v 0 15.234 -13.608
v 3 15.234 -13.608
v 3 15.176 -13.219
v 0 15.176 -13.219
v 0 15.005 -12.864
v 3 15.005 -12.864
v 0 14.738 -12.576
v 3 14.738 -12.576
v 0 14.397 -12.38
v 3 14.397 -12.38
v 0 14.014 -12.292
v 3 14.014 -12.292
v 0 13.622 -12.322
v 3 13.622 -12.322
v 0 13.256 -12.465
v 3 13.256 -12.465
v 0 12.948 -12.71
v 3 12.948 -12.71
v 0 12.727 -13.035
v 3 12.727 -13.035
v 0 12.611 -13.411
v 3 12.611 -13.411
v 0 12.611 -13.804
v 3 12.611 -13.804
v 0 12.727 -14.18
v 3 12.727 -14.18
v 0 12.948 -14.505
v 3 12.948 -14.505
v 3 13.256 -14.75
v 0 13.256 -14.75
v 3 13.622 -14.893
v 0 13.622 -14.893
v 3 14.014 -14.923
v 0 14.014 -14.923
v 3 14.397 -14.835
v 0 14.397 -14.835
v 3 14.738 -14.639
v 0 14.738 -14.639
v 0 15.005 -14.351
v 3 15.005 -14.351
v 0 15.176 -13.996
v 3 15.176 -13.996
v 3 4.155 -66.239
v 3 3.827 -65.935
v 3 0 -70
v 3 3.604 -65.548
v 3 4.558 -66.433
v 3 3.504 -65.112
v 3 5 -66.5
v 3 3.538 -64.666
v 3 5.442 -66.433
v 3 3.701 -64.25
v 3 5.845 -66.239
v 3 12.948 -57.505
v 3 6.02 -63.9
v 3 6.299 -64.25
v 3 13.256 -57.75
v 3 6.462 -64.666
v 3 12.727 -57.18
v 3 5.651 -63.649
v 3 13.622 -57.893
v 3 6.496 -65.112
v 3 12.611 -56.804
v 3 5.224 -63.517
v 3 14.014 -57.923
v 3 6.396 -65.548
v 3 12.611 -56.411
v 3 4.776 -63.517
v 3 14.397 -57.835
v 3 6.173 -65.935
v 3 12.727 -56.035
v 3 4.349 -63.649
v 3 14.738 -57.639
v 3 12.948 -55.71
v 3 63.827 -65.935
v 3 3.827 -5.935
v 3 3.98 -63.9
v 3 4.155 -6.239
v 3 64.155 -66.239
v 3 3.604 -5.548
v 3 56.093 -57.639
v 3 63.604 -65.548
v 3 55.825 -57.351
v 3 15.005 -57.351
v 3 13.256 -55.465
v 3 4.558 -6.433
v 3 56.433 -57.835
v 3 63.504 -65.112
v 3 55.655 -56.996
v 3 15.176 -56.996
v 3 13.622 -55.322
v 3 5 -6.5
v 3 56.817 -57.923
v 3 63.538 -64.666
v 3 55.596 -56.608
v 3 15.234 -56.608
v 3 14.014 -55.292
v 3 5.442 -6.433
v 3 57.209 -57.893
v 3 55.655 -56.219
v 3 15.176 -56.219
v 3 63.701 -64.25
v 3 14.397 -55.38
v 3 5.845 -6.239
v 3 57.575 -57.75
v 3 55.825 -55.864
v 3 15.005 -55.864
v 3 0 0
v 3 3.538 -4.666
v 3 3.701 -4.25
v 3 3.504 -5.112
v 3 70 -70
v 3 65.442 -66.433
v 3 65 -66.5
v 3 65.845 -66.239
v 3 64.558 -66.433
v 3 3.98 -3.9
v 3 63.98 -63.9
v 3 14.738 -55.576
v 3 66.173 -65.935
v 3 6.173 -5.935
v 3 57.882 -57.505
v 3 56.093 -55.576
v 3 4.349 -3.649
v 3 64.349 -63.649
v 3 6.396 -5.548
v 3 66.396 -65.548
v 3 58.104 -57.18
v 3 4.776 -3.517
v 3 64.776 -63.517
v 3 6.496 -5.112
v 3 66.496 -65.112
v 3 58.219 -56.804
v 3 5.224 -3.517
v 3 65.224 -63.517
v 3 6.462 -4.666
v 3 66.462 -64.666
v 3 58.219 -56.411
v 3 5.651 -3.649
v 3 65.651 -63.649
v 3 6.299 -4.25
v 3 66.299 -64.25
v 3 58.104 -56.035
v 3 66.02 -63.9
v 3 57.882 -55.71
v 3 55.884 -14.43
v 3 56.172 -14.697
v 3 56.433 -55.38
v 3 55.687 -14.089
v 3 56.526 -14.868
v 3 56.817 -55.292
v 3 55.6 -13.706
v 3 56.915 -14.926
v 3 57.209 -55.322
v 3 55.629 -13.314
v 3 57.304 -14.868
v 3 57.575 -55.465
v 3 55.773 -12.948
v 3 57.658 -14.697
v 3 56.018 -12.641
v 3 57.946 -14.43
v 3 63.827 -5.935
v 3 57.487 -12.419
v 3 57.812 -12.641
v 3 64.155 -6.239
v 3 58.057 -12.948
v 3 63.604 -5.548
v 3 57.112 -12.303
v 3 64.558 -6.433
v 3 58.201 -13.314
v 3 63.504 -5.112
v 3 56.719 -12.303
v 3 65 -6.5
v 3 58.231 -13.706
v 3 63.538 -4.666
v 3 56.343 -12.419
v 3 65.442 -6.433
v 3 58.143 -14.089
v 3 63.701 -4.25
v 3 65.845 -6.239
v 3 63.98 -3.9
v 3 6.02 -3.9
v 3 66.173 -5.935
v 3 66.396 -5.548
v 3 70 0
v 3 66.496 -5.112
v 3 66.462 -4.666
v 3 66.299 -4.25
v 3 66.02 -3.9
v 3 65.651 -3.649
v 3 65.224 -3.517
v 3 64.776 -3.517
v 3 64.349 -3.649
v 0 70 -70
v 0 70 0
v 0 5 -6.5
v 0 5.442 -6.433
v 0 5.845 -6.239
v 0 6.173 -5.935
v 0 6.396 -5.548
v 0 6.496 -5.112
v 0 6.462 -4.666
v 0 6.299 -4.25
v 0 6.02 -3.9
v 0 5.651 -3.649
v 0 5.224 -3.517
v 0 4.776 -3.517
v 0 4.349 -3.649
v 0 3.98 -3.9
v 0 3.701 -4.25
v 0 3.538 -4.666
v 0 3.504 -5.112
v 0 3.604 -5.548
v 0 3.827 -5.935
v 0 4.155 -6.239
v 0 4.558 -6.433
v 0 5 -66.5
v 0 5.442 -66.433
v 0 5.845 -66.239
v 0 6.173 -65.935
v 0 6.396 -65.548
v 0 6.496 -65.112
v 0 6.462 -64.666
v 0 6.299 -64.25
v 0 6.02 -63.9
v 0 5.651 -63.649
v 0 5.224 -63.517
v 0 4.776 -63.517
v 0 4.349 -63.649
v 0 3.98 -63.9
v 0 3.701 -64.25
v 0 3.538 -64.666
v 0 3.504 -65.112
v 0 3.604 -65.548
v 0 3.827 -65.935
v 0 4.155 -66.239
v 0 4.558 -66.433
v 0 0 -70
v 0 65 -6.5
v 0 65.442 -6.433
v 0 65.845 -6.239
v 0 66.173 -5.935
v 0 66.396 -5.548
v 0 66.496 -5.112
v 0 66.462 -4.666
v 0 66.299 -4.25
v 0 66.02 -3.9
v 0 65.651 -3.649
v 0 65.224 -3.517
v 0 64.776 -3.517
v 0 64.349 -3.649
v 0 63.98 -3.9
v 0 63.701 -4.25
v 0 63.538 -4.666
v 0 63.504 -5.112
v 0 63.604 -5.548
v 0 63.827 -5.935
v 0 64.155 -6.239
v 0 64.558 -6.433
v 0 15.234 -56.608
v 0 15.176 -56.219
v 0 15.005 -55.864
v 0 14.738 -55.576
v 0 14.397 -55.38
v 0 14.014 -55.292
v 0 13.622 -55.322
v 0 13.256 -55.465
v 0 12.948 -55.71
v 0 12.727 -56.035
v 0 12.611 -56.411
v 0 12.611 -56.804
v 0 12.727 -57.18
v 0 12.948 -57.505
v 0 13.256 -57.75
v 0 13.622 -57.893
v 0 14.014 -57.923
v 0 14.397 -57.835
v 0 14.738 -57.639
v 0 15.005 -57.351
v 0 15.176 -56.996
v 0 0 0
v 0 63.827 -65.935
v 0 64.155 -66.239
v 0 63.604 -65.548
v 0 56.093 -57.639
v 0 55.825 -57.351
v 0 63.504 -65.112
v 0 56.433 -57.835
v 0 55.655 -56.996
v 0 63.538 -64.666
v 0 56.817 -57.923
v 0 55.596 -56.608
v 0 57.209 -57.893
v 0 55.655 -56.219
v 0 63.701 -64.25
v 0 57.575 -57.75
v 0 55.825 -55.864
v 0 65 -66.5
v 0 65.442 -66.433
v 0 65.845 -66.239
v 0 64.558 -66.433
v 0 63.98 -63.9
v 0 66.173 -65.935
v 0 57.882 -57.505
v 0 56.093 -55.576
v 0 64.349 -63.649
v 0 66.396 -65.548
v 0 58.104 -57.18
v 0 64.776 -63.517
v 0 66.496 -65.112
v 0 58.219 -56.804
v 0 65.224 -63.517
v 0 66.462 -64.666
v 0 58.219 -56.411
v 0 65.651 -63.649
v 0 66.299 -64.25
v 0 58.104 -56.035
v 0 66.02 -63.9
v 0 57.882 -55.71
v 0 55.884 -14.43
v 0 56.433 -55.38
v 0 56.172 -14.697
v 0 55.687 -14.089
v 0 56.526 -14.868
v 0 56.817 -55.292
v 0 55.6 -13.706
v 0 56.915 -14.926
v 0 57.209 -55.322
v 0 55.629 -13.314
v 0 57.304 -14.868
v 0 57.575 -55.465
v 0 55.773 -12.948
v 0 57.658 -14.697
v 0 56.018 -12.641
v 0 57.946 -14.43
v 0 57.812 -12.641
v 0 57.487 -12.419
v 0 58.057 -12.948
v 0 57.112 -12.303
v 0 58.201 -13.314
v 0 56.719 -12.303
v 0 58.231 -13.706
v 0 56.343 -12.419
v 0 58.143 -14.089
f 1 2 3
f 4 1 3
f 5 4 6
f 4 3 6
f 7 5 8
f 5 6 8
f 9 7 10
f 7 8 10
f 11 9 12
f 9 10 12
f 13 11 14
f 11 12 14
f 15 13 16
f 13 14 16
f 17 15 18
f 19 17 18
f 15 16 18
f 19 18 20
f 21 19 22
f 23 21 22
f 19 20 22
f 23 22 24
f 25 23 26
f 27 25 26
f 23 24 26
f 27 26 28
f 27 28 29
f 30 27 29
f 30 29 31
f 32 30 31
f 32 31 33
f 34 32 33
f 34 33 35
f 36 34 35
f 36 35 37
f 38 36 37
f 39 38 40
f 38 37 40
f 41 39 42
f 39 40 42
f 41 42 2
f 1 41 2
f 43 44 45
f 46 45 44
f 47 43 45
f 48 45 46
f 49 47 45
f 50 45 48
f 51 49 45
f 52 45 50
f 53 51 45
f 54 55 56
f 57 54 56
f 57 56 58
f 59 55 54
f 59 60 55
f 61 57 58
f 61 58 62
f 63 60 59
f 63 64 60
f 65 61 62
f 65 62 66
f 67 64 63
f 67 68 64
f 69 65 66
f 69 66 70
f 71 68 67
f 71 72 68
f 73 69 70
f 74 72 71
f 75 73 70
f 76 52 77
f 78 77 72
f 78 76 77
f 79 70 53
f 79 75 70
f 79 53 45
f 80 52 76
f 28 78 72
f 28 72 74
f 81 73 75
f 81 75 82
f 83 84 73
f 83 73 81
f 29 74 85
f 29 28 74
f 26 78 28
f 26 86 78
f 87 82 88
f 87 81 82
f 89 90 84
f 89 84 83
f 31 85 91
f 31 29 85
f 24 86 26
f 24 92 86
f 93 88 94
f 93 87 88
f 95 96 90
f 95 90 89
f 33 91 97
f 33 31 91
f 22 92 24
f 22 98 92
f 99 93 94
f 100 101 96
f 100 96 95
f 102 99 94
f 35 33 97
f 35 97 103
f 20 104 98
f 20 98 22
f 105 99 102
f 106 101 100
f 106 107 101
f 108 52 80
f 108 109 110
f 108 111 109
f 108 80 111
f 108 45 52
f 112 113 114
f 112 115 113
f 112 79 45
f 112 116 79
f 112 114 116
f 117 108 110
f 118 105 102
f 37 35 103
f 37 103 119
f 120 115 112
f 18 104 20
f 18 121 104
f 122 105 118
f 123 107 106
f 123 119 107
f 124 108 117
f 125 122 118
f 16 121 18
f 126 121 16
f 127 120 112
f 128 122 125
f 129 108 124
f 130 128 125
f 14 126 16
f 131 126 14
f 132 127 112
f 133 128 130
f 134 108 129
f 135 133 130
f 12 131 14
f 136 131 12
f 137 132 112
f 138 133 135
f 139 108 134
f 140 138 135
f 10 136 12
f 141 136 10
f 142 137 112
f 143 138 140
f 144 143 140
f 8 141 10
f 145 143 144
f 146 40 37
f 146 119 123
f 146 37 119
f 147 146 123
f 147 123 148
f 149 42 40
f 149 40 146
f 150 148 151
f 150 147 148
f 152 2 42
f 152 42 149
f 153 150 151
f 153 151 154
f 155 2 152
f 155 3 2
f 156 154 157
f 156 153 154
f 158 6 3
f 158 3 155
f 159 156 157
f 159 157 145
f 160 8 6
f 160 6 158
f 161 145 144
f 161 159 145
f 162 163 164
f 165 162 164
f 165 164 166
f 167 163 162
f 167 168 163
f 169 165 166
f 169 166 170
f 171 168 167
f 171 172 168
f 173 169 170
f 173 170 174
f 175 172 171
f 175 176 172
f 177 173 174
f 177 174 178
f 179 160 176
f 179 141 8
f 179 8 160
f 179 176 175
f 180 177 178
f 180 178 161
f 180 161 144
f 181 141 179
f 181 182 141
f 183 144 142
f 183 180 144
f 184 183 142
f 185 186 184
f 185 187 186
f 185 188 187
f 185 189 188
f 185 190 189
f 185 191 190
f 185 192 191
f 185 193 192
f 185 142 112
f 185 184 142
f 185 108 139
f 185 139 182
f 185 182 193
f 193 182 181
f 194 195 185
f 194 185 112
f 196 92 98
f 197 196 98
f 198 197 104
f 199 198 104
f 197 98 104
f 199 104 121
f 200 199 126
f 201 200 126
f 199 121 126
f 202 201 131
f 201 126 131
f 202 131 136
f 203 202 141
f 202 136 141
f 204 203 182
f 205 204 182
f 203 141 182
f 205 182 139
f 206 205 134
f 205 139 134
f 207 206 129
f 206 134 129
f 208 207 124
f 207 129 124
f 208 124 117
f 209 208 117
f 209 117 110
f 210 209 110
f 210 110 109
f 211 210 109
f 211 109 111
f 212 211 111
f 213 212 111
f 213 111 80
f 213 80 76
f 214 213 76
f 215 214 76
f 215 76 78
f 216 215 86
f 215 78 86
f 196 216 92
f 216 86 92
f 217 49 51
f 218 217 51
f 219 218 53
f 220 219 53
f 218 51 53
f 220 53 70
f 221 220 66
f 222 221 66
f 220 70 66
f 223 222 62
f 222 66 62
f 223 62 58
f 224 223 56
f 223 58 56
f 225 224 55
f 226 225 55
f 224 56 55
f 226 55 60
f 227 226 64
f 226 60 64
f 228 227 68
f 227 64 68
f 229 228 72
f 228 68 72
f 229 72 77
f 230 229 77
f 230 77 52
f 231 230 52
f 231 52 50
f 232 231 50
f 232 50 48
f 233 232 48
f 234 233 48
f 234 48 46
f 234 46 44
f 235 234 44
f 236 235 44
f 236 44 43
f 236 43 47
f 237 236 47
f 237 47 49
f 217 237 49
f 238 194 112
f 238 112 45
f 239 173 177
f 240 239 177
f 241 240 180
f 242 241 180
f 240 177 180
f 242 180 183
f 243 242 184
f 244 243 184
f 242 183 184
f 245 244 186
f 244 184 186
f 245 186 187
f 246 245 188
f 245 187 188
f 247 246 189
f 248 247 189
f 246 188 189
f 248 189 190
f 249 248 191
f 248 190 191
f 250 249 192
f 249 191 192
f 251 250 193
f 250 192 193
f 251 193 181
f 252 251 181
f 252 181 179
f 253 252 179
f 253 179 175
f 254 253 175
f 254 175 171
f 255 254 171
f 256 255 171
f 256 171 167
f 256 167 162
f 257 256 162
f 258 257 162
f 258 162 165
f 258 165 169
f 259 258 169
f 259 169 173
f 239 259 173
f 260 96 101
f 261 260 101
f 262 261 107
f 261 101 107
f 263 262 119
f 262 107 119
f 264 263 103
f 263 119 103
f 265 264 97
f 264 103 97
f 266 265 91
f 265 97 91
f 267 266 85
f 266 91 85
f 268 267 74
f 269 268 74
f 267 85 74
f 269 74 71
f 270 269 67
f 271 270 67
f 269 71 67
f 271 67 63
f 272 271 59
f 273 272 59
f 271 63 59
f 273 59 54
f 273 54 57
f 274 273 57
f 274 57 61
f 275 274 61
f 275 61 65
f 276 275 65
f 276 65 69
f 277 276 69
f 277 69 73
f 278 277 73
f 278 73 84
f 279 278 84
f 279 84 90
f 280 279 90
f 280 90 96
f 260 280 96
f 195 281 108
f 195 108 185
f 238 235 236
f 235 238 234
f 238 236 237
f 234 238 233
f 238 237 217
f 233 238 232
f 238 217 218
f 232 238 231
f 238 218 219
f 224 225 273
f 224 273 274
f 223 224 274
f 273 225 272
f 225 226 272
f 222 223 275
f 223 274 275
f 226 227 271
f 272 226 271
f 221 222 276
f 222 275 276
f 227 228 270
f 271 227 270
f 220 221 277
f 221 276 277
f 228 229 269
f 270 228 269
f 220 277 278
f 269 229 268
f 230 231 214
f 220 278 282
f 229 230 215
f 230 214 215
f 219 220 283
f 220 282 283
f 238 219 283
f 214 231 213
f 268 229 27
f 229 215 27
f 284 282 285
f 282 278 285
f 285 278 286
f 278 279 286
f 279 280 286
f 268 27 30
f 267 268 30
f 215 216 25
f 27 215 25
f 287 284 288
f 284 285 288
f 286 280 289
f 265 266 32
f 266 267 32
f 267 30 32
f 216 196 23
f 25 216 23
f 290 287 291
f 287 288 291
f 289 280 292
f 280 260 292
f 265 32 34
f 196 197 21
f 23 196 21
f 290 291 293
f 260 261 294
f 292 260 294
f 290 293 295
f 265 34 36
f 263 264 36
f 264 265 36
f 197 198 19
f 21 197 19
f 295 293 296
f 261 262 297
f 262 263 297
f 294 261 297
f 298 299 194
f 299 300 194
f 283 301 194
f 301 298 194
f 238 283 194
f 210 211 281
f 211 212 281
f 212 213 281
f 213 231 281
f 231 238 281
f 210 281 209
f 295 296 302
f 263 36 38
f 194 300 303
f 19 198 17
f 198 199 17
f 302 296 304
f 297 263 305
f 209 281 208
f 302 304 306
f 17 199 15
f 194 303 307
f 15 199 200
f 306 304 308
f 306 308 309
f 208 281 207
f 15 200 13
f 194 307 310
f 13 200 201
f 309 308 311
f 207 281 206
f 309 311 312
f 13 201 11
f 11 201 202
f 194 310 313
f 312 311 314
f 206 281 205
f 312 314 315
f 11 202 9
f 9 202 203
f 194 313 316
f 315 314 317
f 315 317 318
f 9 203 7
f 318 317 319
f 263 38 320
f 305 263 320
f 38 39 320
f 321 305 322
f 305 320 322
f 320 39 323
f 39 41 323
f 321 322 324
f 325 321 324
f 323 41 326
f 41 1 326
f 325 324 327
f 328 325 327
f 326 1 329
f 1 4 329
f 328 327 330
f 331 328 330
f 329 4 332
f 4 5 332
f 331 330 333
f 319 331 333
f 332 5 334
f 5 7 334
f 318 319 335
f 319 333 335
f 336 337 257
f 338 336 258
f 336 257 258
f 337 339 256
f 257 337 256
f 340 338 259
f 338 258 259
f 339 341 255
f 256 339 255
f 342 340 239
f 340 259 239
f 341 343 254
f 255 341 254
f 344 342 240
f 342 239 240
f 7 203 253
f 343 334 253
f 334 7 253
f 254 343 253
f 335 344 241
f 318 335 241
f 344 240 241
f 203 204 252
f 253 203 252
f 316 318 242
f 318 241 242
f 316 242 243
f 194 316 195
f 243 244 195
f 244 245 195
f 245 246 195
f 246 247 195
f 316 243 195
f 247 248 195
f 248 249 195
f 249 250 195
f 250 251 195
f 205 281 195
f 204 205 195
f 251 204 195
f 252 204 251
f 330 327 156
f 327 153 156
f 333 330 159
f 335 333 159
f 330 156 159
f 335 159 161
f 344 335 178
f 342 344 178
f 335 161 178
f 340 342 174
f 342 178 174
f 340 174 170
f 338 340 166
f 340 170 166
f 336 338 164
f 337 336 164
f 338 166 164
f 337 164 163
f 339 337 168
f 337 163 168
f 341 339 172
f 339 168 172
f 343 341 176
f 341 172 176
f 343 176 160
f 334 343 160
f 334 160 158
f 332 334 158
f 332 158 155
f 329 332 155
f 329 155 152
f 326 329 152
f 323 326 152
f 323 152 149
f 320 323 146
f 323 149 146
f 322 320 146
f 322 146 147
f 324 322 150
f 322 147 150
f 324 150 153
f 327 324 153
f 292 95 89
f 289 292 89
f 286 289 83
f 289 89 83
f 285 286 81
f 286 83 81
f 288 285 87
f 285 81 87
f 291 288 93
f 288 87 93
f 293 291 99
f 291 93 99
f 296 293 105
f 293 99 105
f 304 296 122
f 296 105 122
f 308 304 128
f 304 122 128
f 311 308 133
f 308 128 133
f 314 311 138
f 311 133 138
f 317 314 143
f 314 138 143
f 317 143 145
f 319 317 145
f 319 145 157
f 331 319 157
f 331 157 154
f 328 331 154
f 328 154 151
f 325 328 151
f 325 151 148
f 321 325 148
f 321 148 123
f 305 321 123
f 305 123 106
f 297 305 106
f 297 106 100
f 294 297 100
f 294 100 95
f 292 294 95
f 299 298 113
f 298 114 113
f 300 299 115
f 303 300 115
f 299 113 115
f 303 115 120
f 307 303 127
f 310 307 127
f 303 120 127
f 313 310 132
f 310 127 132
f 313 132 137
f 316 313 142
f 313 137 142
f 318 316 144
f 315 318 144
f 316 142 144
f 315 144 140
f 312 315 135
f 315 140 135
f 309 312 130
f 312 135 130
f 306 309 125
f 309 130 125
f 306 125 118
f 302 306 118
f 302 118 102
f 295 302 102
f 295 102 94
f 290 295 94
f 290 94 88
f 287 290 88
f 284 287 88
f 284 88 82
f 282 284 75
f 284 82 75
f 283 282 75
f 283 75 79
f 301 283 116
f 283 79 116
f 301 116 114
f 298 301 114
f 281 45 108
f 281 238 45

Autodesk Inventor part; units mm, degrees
ref_plane "YZ Plane" through (0, 0, 0) normal (1, 0, 0) x (0, 1, 0)
ref_plane "XZ Plane" through (0, 0, 0) normal (0, 1, 0) x (-1, 0, 0)
ref_plane "XY Plane" through (0, 0, 0) normal (0, 0, 1) x (1, 0, 0)
sketch "Sketch1" plane through (0, 0, 0) normal (1, 0, 0) x (0, 1, 0)
  line L0 (8.5457, 136.9798) -> (8.5457, 103.4797)
  spline S0 degree 3 poles (19.375, 147.8091) (18.6641, 147.8091) (17.9599, 147.7397) (17.2623, 147.601) (16.5652, 147.4624) (15.8881, 147.2569) (15.2308, 146.9847) (14.5742, 146.7128) (13.9501, 146.3792) (13.3586, 145.984) (12.7676, 145.5892) (12.2206, 145.1402) (11.7175, 144.6372) (11.215, 144.1347) (10.766, 143.5877) (10.3708, 142.9962) (9.9759, 142.4053) (9.6423, 141.7812) (9.37, 141.1239) (9.098, 140.4674) (8.8926, 139.7902) (8.7538, 139.0925) (8.6151, 138.3952) (8.5457, 137.691) (8.5457, 136.9798) knots 0 0 0 0 0.125 0.125 0.125 0.25 0.25 0.25 0.375 0.375 0.375 0.5 0.5 0.5 0.625 0.625 0.625 0.75 0.75 0.75 0.875 0.875 0.875 1 1 1 1
  line L1 (52.875, 147.8091) -> (19.375, 147.8091)
  arc A0 (58.801, 146.0438) -> (54.8456, 147.6282) centre (52.875, 136.9798) ccw
  ellipse E0 centre (52.881, 136.9737) end of major axis (52.8771, 126.1401) minor radius 10.825 (61.939, 142.9057) -> (58.801, 146.0438) ccw
  line L2 (63.7043, 103.4798) -> (63.7043, 136.9798)
  spline S1 degree 3 poles (58.801, 94.4157) (59.4265, 94.8247) (60.0037, 95.2936) (60.5324, 95.8223) (61.061, 96.3507) (61.5298, 96.9279) (61.939, 97.5537) knots 0 0 0 0 0.5 0.5 0.5 1 1 1 1
  spline S2 degree 3 poles (52.875, 92.6505) (53.5374, 92.6505) (54.1943, 92.7107) (54.8456, 92.8313) knots 0 0 0 0 1 1 1 1
  line L3 (19.375, 92.6505) -> (52.875, 92.6505)
  spline S3 degree 3 poles (10.311, 97.5538) (10.72, 96.9282) (11.1888, 96.3511) (11.7175, 95.8223) (12.246, 95.2938) (12.8231, 94.825) (13.449, 94.4158) knots 0 0 0 0 0.5 0.5 0.5 1 1 1 1
  arc A1 (57.625, 140.4108) -> (57.625, 143.0488) centre (57.625, 141.7298) ccw
  arc A2 (57.625, 143.0488) -> (57.625, 140.4108) centre (57.625, 141.7298) ccw
  arc A3 (57.625, 97.4108) -> (57.625, 100.0488) centre (57.625, 98.7298) ccw
  arc A4 (57.625, 100.0488) -> (57.625, 97.4108) centre (57.625, 98.7298) ccw
  arc A5 (14.625, 97.4108) -> (14.625, 100.0488) centre (14.625, 98.7298) ccw
  arc A6 (14.625, 100.0488) -> (14.625, 97.4108) centre (14.625, 98.7298) ccw
  circle A7 centre (14.625, 141.7298) radius 1.319
  arc A8 (63.5235, 138.9504) -> (61.939, 142.9057) centre (52.875, 136.9798) ccw
  line L4 (0, 0) -> (70, 0)
  line L5 (70, 0) -> (70, -70)
  line L6 (70, -70) -> (0, -70)
  line L7 (0, -70) -> (0, 0)
  point P0 (36.125, 120.2298)
  point P1 (63.5235, 101.5091)
  point P2 (62.9439, 99.4934)
  point P3 (56.8613, 93.4109)
  point P4 (57.625, 142.7363)
  dimension "d0" = 70
  dimension "d1" = 70
extrude "Extrusion1" add sketch "Sketch1" along normal blind 3 contours L4 L5 L6 L7
sketch "Sketch2" plane through (3, 0, 0) normal (1, 0, 0) x (0, 0, -1)
  line L0 (7.5282, 52.1652) -> (7.5282, 18.6652)
  spline S0 degree 3 poles (18.3575, 62.9945) (17.6466, 62.9945) (16.9424, 62.9251) (16.2448, 62.7864) (15.5477, 62.6478) (14.8706, 62.4424) (14.2133, 62.1702) (13.5567, 61.8982) (12.9326, 61.5646) (12.341, 61.1694) (11.7501, 60.7746) (11.2031, 60.3257) (10.7, 59.8227) (10.1975, 59.3201) (9.7485, 58.7731) (9.3533, 58.1816) (8.9584, 57.5907) (8.6248, 56.9666) (8.3525, 56.3094) (8.0805, 55.6528) (7.8751, 54.9756) (7.7363, 54.2779) (7.5976, 53.5807) (7.5282, 52.8764) (7.5282, 52.1652) knots 0 0 0 0 0.125 0.125 0.125 0.25 0.25 0.25 0.375 0.375 0.375 0.5 0.5 0.5 0.625 0.625 0.625 0.75 0.75 0.75 0.875 0.875 0.875 1 1 1 1
  line L1 (51.8575, 62.9945) -> (18.3575, 62.9945)
  arc A0 (57.7835, 61.2292) -> (53.8281, 62.8137) centre (51.8575, 52.1652) ccw
  ellipse E0 centre (51.8635, 52.1592) end of major axis (51.8596, 41.3255) minor radius 10.825 (60.9215, 58.0912) -> (57.7835, 61.2292) ccw
  line L2 (62.6868, 18.6652) -> (62.6868, 52.1652)
  spline S1 degree 3 poles (57.7835, 9.6012) (58.409, 10.0102) (58.9862, 10.479) (59.5149, 11.0077) (60.0434, 11.5362) (60.5123, 12.1133) (60.9215, 12.7392) knots 0 0 0 0 0.5 0.5 0.5 1 1 1 1
  spline S2 degree 3 poles (51.8575, 7.8359) (52.5199, 7.8359) (53.1768, 7.8962) (53.8281, 8.0167) knots 0 0 0 0 1 1 1 1
  line L3 (18.3575, 7.8359) -> (51.8575, 7.8359)
  spline S3 degree 3 poles (9.2935, 12.7392) (9.7025, 12.1137) (10.1713, 11.5365) (10.7, 11.0077) (11.2285, 10.4792) (11.8056, 10.0104) (12.4315, 9.6012) knots 0 0 0 0 0.5 0.5 0.5 1 1 1 1
  arc A1 (56.6075, 55.5962) -> (56.6075, 58.2342) centre (56.6075, 56.9152) ccw
  arc A2 (56.6075, 58.2342) -> (56.6075, 55.5962) centre (56.6075, 56.9152) ccw
  arc A3 (56.6075, 12.5962) -> (56.6075, 15.2342) centre (56.6075, 13.9152) ccw
  arc A4 (56.6075, 15.2342) -> (56.6075, 12.5962) centre (56.6075, 13.9152) ccw
  arc A5 (13.6075, 12.5962) -> (13.6075, 15.2342) centre (13.6075, 13.9152) ccw
  arc A6 (13.6075, 15.2342) -> (13.6075, 12.5962) centre (13.6075, 13.9152) ccw
  circle A7 centre (13.6075, 56.9152) radius 1.319
  arc A8 (62.506, 54.1358) -> (60.9215, 58.0912) centre (51.8575, 52.1652) ccw
  point P0 (0, 0)
  point P1 (35.1075, 35.4152)
  point P2 (62.506, 16.6946)
  point P3 (61.9264, 14.6789)
  point P4 (55.8438, 8.5963)
  point P5 (56.6075, 57.9217)
extrude "Extrusion2" cut sketch "Sketch2" against normal blind 68.4375
sketch "Sketch3" plane through (3, 0, 0) normal (1, 0, 0) x (0, 0, -1)
  circle A0 centre (5, 5) radius 1.5
  circle A1 centre (5, 65) radius 1.5
  circle A2 centre (65, 65) radius 1.5
  circle A3 centre (65, 5) radius 1.5
  point P0 (0, 0)
  dimension "d6" = 3
  dimension "d7" = 3
  dimension "d8" = 3
  dimension "d9" = 3
extrude "Extrusion3" cut sketch "Sketch3" against normal blind 39.5125
equation "\"BendRadius\" = Thickness"
equation "\"BendReliefWidth\" = Thickness"
equation "\"BendReliefDepth\" = 0.5 * Thickness"
equation "\"CornerReliefSize\" = 4 * Thickness"
equation "\"MinimumRemnant\" = 2 * Thickness"
equation "\"TransitionRadius\" = BendRadius"
equation "\"JacobiRadiusSize\" = BendRadius"
equation "\"GapSize\" = Thickness"
equation "\"Thickness\" = 3.048"
properties part number "lidar_plate" material "Aluminum 6061"
